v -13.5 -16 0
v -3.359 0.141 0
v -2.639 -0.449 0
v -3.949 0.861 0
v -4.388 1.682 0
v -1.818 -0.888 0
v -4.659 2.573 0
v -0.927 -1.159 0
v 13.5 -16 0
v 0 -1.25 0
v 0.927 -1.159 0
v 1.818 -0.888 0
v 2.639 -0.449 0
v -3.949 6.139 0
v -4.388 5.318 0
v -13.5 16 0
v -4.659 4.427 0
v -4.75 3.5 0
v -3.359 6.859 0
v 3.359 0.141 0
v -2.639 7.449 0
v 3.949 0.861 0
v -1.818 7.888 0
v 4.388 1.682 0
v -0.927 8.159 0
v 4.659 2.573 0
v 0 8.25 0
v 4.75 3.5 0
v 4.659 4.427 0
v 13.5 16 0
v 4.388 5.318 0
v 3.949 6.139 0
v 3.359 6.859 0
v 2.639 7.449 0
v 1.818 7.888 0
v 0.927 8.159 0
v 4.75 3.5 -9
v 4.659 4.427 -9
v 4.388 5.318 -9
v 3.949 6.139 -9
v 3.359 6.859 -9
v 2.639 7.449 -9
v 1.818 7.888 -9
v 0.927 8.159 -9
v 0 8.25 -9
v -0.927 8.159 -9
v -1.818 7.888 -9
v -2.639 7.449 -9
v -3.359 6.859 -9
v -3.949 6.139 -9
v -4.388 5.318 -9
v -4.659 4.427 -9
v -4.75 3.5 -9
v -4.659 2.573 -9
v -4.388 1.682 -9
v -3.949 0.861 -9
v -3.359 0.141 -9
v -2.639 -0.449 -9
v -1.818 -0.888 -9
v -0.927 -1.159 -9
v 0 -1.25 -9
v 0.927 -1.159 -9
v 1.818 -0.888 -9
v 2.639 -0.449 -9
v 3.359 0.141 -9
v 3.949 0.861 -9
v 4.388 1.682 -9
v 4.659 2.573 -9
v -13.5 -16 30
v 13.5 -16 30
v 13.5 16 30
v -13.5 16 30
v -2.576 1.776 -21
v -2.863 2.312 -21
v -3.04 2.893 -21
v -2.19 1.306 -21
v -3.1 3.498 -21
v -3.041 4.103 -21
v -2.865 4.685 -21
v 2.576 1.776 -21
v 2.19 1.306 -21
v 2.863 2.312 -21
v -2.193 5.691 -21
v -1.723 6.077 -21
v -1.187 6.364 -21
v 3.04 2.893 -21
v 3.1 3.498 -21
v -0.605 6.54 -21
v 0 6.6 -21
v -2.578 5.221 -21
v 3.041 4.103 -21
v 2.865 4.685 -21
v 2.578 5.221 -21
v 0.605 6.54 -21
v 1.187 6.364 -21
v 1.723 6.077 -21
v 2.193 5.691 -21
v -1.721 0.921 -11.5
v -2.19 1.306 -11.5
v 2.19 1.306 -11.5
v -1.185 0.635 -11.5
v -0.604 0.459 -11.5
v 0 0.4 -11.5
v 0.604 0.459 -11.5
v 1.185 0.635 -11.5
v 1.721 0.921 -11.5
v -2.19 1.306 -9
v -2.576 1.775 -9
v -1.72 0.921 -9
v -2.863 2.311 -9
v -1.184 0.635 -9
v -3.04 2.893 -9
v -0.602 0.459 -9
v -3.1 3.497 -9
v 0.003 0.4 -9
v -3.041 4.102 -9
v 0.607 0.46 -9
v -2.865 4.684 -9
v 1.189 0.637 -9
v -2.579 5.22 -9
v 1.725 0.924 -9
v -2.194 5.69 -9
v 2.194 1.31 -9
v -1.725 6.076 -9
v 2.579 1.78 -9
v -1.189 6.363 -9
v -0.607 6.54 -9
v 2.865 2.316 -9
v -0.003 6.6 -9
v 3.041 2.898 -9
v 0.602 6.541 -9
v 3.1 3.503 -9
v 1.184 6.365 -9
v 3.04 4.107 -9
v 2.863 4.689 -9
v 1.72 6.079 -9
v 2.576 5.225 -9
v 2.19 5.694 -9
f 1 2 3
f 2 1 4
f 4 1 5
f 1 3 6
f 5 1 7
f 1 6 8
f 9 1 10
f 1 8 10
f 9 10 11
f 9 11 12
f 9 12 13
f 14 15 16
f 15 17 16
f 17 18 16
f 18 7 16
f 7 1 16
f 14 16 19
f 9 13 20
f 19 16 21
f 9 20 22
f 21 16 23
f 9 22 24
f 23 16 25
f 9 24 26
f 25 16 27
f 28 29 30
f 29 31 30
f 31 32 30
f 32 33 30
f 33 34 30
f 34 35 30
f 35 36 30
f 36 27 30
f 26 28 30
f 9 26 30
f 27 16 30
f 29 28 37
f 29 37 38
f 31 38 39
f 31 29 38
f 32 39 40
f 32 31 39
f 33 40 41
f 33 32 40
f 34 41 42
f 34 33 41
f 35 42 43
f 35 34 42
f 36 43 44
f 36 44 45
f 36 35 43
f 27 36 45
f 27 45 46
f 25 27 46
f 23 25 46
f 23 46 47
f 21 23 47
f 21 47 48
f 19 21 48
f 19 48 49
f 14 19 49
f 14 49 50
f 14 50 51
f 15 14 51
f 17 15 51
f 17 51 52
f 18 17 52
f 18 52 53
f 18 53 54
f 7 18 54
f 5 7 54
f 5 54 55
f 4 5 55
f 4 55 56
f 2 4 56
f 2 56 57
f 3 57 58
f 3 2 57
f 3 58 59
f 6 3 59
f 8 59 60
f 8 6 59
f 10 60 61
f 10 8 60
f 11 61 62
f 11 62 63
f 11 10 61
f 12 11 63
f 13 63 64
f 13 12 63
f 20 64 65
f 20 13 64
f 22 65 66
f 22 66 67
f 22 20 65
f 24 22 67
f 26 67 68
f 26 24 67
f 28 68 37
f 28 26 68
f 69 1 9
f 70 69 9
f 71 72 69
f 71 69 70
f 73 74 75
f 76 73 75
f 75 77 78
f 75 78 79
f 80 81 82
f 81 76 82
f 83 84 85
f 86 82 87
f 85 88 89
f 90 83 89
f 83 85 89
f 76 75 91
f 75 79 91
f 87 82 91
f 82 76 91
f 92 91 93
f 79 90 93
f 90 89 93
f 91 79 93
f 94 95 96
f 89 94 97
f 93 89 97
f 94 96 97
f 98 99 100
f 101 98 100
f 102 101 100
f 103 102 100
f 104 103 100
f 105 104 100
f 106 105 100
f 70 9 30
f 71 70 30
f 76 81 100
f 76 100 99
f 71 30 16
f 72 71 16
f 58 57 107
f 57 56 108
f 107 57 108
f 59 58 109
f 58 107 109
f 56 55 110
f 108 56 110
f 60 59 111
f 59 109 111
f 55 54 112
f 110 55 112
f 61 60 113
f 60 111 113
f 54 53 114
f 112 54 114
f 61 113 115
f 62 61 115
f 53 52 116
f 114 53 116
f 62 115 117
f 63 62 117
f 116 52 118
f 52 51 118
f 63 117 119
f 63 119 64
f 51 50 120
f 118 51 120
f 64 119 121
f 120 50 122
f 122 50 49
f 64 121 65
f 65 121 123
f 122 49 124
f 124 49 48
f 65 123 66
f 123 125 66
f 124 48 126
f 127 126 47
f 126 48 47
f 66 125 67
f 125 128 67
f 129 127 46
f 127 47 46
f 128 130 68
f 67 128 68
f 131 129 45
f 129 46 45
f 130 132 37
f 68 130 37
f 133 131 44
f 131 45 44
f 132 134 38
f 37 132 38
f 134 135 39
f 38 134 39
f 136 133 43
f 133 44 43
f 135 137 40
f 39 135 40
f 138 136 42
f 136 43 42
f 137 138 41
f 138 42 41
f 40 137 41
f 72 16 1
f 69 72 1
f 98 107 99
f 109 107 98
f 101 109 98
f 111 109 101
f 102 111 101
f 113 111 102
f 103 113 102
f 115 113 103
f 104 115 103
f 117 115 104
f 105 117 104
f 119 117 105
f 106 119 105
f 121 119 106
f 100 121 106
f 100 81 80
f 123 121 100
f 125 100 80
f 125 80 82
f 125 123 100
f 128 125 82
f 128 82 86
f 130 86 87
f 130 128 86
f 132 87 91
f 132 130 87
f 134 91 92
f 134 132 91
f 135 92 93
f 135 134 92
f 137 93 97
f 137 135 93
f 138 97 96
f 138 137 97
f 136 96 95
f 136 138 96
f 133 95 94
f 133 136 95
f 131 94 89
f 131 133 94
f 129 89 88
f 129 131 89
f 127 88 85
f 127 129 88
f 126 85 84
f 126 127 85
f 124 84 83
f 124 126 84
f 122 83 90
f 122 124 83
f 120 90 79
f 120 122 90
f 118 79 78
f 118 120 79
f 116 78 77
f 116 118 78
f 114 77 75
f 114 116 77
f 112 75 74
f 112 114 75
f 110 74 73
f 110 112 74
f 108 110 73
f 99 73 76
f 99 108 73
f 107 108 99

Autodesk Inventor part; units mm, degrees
ref_plane "YZ Plane" through (0, 0, 0) normal (1, 0, 0) x (0, 1, 0)
ref_plane "XZ Plane" through (0, 0, 0) normal (0, 1, 0) x (-1, 0, 0)
ref_plane "XY Plane" through (0, 0, 0) normal (0, 0, 1) x (1, 0, 0)
sketch "Sketch1" plane through (0, 0, 0) normal (0, 0, 1) x (1, 0, 0)
  line L0 (-13.5, -16) -> (13.5, -16)
  line L1 (13.5, -16) -> (13.5, 16)
  line L2 (13.5, 16) -> (-13.5, 16)
  line L3 (-13.5, 16) -> (-13.5, -16)
  line L4 (-13.5, -16) -> (13.5, 16) construction
  line L5 (13.5, -16) -> (-13.5, 16) construction
  line L6 (0, 0) -> (0, 25.8288) construction
  circle A0 centre (0, 3.5) radius 4.75
  circle A1 centre (0, 3.5) radius 3.1
  line L7 (2.1901, 1.3061) -> (-2.1901, 1.3061)
  dimension "d0" = 27
  dimension "d1" = 32
  dimension "d4" = 9.5
  dimension "d5" = 12.5
  dimension "d8" = 6.2
extrude "Extrusion1" add sketch "Sketch1" along normal blind 30 contours L3 L2 L1 L0 | A0 | A1 L7 | L7 A1
extrude "Extrusion2" add sketch "Sketch1" against normal blind 9 contours A0 | A1 L7 | L7 A1
extrude "Extrusion3" add sketch "Sketch1" against normal blind 21 contours A1 L7 picked at (0.101, 3.0658)
extrude "Extrusion4" add sketch "Sketch1" against normal blind 11.5 contours A1 L7 | L7 A1
properties part number "encoder"
